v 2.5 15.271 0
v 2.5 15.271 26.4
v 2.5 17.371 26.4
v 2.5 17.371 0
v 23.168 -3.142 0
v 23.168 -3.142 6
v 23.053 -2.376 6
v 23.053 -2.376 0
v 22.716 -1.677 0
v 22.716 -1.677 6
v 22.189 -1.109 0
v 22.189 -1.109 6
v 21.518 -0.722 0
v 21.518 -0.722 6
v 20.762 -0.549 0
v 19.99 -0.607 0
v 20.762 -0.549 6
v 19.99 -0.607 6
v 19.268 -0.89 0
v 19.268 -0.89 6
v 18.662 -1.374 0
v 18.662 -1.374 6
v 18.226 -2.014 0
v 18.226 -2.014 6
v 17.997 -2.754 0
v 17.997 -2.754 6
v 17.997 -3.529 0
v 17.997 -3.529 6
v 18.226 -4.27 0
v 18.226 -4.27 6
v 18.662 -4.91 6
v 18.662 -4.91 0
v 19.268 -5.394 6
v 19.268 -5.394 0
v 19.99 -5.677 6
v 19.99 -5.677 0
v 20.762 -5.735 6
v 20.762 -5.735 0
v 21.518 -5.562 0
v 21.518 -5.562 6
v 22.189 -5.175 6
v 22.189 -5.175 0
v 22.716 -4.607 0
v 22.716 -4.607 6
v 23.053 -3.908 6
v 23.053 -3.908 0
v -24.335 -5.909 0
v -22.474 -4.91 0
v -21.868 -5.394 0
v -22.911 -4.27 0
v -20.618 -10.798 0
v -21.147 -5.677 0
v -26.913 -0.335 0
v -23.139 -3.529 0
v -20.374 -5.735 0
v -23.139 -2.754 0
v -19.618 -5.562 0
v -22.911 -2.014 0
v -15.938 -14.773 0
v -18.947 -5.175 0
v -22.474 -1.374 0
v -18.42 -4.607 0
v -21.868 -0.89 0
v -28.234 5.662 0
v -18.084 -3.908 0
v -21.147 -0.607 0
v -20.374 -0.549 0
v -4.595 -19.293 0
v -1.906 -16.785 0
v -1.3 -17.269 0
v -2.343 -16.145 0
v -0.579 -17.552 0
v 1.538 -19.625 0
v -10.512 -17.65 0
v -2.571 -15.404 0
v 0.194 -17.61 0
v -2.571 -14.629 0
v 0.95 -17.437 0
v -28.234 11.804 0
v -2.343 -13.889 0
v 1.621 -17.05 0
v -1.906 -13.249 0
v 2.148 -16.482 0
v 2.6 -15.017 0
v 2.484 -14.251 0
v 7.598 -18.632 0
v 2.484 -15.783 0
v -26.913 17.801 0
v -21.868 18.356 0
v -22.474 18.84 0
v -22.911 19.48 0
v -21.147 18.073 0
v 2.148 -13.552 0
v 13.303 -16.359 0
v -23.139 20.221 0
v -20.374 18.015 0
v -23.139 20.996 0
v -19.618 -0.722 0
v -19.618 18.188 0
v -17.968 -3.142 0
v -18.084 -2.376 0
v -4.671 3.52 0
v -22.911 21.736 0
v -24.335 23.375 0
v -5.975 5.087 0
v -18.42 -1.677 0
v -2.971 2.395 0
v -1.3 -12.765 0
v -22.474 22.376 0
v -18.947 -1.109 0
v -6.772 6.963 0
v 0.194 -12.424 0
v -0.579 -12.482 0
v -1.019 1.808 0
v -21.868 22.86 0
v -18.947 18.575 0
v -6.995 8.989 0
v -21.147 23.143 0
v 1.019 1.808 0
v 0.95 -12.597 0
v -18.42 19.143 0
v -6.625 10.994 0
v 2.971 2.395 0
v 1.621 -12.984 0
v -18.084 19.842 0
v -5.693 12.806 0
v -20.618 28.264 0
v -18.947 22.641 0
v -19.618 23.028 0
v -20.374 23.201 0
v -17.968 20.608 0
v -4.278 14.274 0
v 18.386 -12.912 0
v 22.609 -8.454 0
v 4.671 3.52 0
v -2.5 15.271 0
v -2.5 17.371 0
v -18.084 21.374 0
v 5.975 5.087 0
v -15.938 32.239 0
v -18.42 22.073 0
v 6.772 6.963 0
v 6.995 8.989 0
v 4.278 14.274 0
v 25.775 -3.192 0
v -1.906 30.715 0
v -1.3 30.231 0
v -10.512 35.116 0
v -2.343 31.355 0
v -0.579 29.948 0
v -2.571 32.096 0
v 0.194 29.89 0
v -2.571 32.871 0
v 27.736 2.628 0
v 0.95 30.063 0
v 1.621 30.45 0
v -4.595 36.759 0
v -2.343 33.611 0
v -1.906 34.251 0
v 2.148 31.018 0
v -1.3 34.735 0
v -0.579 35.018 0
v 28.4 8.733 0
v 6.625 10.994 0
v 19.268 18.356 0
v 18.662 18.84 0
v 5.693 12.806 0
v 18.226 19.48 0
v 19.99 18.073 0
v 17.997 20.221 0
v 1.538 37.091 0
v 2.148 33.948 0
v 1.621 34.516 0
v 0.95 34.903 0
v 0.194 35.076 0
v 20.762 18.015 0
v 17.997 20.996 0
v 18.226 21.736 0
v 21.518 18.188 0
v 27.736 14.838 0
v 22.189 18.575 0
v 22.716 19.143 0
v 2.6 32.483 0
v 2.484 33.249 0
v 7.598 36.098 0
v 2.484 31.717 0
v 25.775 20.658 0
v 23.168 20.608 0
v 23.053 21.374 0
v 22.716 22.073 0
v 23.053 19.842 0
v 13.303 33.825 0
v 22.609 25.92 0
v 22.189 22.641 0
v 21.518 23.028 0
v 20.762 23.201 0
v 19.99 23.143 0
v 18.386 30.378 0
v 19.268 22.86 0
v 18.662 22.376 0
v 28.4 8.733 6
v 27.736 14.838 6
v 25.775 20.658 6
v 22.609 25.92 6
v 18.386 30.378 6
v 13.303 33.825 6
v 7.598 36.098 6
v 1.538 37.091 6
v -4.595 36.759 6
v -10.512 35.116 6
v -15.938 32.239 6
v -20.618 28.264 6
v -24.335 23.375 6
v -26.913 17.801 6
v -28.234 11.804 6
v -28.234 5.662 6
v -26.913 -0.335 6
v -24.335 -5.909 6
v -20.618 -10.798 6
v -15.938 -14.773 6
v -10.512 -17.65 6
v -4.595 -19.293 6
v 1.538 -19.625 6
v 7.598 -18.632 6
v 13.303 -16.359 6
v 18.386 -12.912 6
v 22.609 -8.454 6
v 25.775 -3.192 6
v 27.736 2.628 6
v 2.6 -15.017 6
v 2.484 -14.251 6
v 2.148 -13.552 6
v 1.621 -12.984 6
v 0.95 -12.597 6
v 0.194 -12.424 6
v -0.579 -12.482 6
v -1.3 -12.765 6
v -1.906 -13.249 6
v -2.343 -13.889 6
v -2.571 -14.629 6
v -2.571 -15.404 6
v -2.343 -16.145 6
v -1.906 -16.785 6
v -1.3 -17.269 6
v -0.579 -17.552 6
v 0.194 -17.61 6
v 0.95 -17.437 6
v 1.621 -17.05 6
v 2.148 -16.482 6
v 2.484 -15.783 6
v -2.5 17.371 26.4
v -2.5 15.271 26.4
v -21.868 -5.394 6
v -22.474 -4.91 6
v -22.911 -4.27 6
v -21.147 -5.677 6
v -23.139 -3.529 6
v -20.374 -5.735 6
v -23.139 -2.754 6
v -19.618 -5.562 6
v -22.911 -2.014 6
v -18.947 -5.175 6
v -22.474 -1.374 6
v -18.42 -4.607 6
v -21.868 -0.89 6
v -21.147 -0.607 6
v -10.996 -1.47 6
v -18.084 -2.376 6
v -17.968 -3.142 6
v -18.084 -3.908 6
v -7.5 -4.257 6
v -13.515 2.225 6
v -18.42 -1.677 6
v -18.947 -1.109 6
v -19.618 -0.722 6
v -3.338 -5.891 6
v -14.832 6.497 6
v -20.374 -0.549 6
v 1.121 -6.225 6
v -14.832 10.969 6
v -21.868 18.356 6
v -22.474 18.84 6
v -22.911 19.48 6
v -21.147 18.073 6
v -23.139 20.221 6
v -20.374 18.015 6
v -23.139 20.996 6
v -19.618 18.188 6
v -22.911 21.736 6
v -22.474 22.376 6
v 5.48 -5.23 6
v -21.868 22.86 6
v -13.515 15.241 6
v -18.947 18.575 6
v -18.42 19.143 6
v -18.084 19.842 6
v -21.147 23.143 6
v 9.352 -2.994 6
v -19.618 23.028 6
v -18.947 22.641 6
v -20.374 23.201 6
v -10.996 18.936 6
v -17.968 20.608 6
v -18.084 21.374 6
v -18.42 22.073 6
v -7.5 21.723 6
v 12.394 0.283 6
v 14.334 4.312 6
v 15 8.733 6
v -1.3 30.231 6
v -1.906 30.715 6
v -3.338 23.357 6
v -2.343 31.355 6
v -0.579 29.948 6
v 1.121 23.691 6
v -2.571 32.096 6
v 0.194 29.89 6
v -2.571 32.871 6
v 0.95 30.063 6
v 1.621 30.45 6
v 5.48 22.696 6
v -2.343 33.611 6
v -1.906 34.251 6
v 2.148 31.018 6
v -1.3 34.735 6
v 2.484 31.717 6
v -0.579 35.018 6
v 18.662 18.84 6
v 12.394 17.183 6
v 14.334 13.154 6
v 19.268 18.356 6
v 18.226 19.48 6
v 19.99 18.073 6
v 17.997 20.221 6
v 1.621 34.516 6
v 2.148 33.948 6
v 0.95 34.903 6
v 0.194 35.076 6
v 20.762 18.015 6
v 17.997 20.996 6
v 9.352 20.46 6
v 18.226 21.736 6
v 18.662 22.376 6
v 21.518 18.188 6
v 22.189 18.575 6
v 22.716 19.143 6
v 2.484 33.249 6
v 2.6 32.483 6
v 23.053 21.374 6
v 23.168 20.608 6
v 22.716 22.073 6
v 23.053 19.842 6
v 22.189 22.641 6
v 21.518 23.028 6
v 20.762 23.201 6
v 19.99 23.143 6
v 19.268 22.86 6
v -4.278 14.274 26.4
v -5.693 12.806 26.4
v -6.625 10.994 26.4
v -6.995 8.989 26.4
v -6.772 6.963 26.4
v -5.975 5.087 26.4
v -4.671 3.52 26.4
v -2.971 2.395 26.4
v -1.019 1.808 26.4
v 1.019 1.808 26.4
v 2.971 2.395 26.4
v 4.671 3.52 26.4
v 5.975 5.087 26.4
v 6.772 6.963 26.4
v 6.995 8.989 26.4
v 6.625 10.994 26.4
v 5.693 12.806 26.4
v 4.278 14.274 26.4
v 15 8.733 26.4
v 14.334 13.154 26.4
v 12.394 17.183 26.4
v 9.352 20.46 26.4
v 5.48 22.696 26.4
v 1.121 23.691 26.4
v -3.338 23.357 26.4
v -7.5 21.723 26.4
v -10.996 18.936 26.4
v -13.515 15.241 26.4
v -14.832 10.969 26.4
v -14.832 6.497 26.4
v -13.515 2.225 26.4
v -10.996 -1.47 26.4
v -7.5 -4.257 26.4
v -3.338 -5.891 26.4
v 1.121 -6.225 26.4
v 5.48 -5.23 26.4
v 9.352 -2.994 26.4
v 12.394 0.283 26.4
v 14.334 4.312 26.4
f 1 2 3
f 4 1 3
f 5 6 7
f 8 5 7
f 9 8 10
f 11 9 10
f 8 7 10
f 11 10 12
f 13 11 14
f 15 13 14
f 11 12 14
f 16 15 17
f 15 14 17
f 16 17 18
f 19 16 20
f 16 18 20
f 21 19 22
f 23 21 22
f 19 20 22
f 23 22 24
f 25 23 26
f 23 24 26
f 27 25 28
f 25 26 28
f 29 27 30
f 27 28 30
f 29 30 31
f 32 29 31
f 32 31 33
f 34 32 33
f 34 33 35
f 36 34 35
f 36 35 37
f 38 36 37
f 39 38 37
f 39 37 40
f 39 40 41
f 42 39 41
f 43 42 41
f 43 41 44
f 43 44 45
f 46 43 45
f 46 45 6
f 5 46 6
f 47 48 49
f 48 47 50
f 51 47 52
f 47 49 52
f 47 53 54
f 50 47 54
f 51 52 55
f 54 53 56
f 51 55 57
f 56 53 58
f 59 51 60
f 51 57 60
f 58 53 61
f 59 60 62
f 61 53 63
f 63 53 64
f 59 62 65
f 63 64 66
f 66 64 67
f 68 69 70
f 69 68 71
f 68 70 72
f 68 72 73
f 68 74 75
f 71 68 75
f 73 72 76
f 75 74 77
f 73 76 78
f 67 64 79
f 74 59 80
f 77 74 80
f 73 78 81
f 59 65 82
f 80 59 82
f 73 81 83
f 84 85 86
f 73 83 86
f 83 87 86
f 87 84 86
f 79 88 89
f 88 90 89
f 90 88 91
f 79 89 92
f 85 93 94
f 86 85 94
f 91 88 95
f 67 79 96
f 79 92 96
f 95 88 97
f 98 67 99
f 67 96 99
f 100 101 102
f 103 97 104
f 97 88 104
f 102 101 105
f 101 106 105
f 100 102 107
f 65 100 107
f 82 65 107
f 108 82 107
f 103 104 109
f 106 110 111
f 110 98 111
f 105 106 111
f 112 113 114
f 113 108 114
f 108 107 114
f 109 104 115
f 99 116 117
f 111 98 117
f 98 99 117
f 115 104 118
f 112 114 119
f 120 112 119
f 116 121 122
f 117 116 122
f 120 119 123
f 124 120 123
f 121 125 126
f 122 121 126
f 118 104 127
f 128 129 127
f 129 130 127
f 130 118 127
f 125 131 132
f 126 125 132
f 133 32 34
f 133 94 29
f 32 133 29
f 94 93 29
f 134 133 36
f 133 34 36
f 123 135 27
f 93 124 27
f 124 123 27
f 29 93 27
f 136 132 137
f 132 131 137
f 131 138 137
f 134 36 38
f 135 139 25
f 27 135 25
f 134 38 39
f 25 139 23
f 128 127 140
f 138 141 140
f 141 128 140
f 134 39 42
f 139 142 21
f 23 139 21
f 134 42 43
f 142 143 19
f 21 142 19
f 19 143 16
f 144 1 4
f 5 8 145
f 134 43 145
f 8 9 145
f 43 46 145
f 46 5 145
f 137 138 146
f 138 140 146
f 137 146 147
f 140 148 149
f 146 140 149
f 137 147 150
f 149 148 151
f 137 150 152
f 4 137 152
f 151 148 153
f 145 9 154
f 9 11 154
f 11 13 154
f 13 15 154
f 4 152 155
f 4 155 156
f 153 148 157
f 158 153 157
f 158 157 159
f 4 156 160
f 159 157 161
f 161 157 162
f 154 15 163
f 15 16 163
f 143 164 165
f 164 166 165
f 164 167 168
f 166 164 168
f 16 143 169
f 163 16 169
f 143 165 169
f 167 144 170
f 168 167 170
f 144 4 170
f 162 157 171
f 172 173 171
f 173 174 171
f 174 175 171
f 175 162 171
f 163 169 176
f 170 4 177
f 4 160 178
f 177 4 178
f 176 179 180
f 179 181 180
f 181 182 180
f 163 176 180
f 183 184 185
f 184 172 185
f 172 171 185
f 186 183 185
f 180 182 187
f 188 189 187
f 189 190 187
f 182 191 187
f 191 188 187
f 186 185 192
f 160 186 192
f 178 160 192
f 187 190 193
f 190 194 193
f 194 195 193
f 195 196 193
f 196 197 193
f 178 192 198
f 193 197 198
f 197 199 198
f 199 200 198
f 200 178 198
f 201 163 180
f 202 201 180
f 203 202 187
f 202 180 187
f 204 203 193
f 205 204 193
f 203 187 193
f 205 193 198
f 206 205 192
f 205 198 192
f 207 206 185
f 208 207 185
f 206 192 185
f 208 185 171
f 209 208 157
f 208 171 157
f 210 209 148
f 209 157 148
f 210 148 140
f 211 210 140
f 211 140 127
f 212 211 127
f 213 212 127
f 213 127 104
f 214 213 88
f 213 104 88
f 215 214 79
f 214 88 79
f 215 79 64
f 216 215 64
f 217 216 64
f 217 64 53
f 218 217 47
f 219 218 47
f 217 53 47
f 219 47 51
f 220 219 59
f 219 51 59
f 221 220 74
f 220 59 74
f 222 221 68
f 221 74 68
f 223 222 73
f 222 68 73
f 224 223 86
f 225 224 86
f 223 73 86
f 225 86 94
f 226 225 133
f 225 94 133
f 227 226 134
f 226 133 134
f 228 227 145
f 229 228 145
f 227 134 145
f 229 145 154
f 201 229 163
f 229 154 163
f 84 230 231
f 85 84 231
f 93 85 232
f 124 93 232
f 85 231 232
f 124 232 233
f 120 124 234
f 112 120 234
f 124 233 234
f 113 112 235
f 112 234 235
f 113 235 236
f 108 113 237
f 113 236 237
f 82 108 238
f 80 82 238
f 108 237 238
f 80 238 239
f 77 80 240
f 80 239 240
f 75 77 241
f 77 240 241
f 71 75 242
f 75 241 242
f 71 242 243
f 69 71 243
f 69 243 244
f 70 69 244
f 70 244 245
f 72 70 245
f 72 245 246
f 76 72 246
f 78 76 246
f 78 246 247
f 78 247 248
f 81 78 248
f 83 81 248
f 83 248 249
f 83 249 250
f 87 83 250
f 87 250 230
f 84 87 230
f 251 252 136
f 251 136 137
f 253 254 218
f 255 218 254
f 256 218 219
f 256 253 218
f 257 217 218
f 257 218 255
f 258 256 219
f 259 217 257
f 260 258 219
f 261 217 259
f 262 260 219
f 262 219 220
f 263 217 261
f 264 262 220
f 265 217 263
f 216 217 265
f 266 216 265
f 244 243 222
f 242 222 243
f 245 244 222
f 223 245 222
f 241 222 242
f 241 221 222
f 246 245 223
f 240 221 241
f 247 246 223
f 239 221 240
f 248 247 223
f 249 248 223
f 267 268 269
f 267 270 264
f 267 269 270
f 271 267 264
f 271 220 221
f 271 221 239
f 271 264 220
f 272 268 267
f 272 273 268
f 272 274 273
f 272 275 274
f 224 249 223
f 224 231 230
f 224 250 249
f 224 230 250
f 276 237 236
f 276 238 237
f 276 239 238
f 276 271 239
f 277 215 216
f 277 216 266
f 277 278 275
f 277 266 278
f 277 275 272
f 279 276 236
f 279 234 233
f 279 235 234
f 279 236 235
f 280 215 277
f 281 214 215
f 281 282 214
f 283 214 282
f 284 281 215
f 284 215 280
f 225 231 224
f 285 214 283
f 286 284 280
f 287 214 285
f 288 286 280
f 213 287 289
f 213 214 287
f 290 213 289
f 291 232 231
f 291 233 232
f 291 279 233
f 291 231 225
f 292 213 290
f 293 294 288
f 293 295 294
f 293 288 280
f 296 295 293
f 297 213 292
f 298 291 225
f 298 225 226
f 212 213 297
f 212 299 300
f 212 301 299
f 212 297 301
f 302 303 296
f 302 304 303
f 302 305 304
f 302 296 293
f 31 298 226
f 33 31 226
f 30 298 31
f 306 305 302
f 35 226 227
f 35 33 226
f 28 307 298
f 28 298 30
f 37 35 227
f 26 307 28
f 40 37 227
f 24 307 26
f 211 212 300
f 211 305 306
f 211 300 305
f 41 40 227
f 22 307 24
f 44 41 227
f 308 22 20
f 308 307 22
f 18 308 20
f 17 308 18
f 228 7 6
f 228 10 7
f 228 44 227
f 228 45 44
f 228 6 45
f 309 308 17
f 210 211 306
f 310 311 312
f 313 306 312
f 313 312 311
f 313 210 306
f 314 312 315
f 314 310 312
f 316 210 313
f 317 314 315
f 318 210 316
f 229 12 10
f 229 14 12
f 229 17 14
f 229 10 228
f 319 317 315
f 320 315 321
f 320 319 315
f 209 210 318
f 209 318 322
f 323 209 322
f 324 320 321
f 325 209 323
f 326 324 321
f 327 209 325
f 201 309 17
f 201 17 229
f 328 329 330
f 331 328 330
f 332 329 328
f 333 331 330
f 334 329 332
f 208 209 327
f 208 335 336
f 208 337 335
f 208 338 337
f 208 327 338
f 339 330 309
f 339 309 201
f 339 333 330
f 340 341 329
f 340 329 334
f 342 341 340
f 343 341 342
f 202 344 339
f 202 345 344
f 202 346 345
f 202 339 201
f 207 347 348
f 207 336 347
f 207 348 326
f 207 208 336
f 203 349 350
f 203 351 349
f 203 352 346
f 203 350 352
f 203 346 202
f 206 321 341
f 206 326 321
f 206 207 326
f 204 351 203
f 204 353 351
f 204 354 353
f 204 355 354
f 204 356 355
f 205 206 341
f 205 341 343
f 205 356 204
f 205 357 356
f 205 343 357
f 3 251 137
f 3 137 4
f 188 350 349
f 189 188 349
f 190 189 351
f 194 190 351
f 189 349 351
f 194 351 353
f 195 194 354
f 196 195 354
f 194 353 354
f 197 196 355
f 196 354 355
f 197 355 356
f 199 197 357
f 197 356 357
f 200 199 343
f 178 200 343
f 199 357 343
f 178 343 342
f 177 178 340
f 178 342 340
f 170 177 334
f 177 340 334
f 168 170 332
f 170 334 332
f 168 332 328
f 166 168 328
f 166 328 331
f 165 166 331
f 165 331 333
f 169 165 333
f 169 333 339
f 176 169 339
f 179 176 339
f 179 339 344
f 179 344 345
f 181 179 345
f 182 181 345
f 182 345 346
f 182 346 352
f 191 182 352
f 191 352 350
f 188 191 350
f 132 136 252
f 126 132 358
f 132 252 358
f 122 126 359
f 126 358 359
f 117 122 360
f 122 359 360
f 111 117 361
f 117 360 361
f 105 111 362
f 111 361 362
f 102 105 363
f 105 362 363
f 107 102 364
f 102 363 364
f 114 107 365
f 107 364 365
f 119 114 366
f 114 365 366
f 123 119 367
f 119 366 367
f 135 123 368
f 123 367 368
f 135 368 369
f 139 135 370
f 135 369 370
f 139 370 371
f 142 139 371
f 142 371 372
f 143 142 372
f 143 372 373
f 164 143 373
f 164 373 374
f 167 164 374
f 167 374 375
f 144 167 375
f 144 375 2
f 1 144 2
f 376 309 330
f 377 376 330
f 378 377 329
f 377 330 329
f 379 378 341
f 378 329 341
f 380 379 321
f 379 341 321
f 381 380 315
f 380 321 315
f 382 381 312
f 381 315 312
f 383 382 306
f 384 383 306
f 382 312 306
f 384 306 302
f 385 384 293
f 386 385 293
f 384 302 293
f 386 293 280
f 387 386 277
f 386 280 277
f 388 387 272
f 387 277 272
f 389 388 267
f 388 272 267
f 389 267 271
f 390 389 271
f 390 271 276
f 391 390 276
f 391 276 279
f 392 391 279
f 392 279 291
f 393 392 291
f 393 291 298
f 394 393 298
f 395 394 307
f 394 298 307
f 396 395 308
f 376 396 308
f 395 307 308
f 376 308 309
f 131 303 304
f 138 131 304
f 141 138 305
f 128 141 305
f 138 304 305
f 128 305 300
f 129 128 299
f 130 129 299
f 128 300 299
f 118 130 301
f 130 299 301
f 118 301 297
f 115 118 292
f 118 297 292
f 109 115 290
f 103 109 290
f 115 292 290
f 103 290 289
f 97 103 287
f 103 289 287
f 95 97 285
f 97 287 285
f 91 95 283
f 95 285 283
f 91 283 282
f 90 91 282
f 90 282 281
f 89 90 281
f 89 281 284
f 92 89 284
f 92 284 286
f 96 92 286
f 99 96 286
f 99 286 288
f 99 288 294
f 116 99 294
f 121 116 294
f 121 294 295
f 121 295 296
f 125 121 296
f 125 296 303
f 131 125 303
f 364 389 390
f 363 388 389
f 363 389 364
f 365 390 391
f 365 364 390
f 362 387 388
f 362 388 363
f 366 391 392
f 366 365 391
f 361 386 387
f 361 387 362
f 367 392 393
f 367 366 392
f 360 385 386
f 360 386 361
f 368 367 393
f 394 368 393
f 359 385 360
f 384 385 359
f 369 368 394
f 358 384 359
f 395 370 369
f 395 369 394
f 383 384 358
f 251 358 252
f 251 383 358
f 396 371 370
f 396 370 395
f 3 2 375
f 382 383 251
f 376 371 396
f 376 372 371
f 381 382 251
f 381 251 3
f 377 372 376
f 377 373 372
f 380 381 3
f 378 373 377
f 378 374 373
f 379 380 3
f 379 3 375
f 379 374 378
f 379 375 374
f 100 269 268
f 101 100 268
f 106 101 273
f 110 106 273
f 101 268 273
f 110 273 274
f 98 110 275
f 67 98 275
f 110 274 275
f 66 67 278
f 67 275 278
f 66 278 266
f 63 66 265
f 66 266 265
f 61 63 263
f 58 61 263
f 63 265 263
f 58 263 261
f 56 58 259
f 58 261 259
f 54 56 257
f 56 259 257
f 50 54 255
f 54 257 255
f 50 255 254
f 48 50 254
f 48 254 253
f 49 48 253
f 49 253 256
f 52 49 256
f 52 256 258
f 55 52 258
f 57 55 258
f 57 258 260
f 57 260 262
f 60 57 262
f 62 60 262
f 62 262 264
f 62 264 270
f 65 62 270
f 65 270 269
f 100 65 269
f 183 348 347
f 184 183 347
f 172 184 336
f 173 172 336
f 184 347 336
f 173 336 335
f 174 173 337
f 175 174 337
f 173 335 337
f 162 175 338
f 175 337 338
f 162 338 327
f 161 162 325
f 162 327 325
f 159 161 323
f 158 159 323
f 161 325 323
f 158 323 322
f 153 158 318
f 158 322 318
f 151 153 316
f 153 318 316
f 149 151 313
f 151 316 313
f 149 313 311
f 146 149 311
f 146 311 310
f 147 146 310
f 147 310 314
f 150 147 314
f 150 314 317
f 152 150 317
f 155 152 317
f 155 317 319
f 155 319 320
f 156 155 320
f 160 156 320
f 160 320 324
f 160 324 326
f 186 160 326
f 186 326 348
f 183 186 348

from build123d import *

# Parameters (mm, degrees)
SKETCH_1_R          = 28.4
EXTRUDE_1_DEPTH     = 6
SKETCH_2_R          = 15
EXTRUDE_2_DEPTH     = 20.4
SKETCH_3_R          = 7
CUT_EXTRUDE_1_DEPTH = 54.68780863
SKETCH_4_W          = 5
SKETCH_4_H          = 2.1
CUT_EXTRUDE_2_DEPTH = 54.68780863
SKETCH_5_R          = 2.6
CUT_EXTRUDE_3_DEPTH = 52.005693755


with BuildPart() as part:
    # 草图1 → 凸台-拉伸1 (new body)
    with BuildSketch(Plane.XY):
        with Locations((0, 8.733014899)):
            Circle(SKETCH_1_R)
    extrude(amount=EXTRUDE_1_DEPTH)

    # 草图2 → 凸台-拉伸2 (add)
    with BuildSketch(Plane.XY.offset(6)):
        with Locations((0, 8.733014899)):
            Circle(SKETCH_2_R)
    extrude(amount=EXTRUDE_2_DEPTH)

    # 草图3 → 切除-拉伸1 (cut, through all)
    with BuildSketch(Plane.XY.offset(26.4)):
        with Locations((0, 8.733014899)):
            Circle(SKETCH_3_R)
    extrude(amount=-CUT_EXTRUDE_1_DEPTH, mode=Mode.SUBTRACT)

    # 草图4 → 切除-拉伸2 (cut, through all)
    with BuildSketch(Plane.XY.offset(26.4)):
        with Locations((0, 16.321363314)):
            Rectangle(SKETCH_4_W, SKETCH_4_H)
    extrude(amount=-CUT_EXTRUDE_2_DEPTH, mode=Mode.SUBTRACT)

    # 草图5 → 切除-拉伸3 (cut, through all)
    with BuildSketch(Plane.XY.offset(6)):
        with Locations((0, 32.483014899)):
            Circle(SKETCH_5_R)
        with Locations((20.56810334, 20.608014899)):
            Circle(SKETCH_5_R)
        with Locations((20.56810334, -3.141985101)):
            Circle(SKETCH_5_R)
        with Locations((0, -15.016985101)):
            Circle(SKETCH_5_R)
        with Locations((-20.56810334, -3.141985101)):
            Circle(SKETCH_5_R)
        with Locations((-20.56810334, 20.608014899)):
            Circle(SKETCH_5_R)
    extrude(amount=-CUT_EXTRUDE_3_DEPTH, mode=Mode.SUBTRACT)


solid = part.part
